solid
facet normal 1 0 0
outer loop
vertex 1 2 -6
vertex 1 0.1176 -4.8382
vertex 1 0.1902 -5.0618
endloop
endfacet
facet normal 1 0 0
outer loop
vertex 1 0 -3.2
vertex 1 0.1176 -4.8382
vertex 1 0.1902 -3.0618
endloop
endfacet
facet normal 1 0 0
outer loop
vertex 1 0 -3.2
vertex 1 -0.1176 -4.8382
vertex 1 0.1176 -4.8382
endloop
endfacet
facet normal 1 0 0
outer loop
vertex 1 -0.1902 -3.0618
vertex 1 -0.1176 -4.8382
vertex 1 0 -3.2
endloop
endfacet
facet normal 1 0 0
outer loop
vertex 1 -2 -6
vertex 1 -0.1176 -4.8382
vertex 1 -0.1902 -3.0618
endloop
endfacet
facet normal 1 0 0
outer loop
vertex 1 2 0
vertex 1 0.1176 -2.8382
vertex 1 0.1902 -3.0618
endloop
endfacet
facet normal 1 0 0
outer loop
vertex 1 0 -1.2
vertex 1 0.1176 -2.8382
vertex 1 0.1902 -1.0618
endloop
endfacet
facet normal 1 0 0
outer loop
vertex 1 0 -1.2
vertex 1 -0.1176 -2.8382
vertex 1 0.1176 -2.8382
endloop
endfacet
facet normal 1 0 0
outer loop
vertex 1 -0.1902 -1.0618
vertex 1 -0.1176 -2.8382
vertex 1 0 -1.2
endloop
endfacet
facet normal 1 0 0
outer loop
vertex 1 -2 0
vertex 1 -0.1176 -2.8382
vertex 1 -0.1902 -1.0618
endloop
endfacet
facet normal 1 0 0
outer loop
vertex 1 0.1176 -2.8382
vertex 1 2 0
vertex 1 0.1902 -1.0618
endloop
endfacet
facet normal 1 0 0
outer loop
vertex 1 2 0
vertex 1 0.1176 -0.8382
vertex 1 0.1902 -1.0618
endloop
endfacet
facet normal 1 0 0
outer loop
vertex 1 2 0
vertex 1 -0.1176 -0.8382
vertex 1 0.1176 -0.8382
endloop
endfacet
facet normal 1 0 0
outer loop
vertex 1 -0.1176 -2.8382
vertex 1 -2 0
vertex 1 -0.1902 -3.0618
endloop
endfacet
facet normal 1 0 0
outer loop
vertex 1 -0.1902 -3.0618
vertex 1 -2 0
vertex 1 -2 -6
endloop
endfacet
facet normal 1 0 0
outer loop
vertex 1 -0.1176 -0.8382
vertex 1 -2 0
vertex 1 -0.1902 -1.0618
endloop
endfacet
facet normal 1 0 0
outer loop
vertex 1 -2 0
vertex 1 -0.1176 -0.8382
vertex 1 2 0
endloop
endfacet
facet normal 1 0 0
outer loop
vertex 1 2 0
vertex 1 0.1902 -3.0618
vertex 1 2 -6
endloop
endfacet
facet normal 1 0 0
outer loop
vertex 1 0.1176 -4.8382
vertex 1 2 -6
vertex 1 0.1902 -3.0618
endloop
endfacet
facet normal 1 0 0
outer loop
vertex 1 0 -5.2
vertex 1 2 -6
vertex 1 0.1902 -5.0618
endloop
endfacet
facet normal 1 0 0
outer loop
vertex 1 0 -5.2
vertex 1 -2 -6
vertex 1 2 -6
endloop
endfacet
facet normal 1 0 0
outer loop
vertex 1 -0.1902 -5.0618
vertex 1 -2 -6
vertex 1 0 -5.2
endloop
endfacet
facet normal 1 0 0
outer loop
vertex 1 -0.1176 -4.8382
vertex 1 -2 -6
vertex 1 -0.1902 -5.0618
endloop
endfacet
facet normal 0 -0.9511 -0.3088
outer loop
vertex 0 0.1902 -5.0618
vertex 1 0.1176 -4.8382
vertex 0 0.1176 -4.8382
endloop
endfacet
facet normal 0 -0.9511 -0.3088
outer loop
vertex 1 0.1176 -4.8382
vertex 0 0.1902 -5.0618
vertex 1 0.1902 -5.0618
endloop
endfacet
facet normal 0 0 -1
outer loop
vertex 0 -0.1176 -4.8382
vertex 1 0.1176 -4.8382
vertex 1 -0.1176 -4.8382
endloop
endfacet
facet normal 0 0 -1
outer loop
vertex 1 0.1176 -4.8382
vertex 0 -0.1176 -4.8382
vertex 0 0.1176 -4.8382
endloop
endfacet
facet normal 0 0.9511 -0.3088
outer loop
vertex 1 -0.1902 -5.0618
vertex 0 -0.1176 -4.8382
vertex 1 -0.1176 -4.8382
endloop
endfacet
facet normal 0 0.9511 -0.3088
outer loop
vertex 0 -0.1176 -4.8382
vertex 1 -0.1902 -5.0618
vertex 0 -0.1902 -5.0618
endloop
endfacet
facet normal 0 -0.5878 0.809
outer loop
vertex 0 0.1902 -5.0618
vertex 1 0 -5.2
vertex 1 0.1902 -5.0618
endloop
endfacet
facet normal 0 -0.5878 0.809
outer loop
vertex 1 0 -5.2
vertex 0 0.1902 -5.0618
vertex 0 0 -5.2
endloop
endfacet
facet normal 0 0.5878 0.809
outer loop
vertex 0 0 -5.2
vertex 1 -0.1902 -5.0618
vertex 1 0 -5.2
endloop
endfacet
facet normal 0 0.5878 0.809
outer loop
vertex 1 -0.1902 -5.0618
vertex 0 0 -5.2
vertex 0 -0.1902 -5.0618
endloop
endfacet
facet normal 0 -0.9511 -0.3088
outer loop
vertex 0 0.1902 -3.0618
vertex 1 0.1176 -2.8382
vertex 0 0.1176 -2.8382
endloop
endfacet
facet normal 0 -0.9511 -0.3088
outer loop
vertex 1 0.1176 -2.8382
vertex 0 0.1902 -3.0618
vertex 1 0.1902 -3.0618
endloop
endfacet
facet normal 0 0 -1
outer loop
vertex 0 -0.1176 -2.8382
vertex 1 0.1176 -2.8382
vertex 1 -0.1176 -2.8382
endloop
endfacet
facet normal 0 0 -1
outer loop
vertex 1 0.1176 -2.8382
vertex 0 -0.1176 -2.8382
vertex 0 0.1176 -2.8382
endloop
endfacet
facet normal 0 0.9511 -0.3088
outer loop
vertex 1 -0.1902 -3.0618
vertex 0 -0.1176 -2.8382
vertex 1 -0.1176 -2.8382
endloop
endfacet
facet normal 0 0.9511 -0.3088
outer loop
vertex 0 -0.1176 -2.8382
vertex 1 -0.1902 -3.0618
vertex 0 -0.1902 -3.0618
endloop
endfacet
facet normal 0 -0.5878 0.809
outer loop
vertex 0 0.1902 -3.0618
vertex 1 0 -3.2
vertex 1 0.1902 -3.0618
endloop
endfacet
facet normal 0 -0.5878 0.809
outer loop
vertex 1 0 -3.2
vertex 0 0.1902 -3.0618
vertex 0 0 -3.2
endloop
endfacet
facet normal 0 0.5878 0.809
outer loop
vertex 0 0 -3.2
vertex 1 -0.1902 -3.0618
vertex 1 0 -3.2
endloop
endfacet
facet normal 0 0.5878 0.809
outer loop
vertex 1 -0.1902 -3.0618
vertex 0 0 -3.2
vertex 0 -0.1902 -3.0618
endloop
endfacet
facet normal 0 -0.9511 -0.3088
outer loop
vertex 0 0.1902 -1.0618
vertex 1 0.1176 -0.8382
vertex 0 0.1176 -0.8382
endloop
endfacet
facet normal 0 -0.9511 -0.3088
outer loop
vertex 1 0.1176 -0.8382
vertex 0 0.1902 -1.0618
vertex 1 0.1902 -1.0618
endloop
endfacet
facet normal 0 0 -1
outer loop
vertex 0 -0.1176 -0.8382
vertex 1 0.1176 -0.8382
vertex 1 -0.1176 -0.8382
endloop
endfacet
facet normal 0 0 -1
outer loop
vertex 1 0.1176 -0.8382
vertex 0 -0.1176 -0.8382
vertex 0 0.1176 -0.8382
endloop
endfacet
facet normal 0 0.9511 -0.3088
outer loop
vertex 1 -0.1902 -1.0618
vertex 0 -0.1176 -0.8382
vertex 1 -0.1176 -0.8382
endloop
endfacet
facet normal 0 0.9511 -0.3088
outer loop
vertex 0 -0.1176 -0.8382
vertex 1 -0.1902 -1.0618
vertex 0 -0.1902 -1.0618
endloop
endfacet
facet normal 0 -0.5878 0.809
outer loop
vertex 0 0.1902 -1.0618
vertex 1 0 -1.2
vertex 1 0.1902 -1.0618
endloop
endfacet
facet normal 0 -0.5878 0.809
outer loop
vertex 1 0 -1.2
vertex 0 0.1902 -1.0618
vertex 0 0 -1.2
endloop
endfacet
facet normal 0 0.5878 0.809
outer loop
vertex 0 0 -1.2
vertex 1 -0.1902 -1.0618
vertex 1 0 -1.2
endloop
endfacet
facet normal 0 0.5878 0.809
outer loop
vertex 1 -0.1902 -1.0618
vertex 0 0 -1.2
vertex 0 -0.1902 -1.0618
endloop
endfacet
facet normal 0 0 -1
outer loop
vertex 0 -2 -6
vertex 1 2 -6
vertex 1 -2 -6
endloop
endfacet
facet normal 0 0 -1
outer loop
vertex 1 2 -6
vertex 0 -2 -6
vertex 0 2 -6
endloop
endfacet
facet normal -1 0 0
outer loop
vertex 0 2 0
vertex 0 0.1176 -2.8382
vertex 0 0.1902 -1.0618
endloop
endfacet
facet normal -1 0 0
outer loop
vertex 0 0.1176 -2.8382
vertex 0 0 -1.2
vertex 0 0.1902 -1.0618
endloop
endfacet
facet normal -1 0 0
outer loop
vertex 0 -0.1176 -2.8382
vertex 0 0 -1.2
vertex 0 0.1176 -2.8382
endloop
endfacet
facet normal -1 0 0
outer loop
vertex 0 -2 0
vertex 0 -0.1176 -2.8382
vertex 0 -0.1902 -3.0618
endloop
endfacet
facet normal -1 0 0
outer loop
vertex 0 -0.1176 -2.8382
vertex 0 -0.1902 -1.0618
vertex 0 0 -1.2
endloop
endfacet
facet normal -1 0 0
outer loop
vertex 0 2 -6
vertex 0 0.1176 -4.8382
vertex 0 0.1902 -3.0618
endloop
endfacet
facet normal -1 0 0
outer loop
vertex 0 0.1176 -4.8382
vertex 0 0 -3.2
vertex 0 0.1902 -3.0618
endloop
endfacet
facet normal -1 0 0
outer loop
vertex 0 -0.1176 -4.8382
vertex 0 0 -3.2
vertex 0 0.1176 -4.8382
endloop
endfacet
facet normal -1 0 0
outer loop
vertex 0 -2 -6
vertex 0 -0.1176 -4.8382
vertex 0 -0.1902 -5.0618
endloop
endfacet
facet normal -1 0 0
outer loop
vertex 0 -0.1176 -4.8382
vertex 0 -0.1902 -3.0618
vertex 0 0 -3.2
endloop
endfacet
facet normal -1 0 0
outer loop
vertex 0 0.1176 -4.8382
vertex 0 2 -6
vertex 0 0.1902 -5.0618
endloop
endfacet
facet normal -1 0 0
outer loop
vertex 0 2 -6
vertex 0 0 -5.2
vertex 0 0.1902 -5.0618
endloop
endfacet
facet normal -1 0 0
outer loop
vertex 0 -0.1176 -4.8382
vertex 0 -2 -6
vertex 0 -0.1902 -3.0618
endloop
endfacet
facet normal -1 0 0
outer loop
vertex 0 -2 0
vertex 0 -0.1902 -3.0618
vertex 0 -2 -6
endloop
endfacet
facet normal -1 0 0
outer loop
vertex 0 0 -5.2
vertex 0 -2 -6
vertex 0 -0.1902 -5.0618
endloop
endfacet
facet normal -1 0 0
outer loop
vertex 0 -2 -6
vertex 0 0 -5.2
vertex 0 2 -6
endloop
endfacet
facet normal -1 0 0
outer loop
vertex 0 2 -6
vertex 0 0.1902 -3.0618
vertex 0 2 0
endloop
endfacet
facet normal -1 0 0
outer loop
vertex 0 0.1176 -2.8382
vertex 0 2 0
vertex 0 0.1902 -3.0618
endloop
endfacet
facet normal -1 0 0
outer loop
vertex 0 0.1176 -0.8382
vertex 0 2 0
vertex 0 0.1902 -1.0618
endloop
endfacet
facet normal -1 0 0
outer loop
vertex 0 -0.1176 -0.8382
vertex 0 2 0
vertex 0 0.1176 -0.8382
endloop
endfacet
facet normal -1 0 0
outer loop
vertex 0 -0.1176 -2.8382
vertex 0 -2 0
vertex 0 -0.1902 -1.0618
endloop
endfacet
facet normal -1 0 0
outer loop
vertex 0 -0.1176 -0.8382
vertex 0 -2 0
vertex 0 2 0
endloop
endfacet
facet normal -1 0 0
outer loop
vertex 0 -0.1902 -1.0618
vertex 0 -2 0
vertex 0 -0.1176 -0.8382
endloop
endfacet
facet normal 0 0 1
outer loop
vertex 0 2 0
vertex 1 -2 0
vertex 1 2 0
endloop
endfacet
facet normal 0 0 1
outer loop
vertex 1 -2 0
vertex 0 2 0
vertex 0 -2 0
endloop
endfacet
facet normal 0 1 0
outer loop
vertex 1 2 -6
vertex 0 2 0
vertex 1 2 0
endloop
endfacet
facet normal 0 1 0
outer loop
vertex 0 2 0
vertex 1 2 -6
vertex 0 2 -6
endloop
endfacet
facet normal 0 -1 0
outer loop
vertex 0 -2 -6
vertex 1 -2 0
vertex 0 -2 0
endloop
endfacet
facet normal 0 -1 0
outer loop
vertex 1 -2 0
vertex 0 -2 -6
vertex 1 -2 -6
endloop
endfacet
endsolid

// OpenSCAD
module scaffold(h=12){
   color("green") 
    
   difference(){
       translate([0,-2,0])
       rotate([90,90,90])
       cube([6,4,1]);  
       
       for (a =[-h/2:5]){
          translate([-1,0,a*2+1])
          rotate([90,90,90])
          cylinder(2,0.2,0.2);
       }
      
   }
   
      
       
     

}

scaffold();
